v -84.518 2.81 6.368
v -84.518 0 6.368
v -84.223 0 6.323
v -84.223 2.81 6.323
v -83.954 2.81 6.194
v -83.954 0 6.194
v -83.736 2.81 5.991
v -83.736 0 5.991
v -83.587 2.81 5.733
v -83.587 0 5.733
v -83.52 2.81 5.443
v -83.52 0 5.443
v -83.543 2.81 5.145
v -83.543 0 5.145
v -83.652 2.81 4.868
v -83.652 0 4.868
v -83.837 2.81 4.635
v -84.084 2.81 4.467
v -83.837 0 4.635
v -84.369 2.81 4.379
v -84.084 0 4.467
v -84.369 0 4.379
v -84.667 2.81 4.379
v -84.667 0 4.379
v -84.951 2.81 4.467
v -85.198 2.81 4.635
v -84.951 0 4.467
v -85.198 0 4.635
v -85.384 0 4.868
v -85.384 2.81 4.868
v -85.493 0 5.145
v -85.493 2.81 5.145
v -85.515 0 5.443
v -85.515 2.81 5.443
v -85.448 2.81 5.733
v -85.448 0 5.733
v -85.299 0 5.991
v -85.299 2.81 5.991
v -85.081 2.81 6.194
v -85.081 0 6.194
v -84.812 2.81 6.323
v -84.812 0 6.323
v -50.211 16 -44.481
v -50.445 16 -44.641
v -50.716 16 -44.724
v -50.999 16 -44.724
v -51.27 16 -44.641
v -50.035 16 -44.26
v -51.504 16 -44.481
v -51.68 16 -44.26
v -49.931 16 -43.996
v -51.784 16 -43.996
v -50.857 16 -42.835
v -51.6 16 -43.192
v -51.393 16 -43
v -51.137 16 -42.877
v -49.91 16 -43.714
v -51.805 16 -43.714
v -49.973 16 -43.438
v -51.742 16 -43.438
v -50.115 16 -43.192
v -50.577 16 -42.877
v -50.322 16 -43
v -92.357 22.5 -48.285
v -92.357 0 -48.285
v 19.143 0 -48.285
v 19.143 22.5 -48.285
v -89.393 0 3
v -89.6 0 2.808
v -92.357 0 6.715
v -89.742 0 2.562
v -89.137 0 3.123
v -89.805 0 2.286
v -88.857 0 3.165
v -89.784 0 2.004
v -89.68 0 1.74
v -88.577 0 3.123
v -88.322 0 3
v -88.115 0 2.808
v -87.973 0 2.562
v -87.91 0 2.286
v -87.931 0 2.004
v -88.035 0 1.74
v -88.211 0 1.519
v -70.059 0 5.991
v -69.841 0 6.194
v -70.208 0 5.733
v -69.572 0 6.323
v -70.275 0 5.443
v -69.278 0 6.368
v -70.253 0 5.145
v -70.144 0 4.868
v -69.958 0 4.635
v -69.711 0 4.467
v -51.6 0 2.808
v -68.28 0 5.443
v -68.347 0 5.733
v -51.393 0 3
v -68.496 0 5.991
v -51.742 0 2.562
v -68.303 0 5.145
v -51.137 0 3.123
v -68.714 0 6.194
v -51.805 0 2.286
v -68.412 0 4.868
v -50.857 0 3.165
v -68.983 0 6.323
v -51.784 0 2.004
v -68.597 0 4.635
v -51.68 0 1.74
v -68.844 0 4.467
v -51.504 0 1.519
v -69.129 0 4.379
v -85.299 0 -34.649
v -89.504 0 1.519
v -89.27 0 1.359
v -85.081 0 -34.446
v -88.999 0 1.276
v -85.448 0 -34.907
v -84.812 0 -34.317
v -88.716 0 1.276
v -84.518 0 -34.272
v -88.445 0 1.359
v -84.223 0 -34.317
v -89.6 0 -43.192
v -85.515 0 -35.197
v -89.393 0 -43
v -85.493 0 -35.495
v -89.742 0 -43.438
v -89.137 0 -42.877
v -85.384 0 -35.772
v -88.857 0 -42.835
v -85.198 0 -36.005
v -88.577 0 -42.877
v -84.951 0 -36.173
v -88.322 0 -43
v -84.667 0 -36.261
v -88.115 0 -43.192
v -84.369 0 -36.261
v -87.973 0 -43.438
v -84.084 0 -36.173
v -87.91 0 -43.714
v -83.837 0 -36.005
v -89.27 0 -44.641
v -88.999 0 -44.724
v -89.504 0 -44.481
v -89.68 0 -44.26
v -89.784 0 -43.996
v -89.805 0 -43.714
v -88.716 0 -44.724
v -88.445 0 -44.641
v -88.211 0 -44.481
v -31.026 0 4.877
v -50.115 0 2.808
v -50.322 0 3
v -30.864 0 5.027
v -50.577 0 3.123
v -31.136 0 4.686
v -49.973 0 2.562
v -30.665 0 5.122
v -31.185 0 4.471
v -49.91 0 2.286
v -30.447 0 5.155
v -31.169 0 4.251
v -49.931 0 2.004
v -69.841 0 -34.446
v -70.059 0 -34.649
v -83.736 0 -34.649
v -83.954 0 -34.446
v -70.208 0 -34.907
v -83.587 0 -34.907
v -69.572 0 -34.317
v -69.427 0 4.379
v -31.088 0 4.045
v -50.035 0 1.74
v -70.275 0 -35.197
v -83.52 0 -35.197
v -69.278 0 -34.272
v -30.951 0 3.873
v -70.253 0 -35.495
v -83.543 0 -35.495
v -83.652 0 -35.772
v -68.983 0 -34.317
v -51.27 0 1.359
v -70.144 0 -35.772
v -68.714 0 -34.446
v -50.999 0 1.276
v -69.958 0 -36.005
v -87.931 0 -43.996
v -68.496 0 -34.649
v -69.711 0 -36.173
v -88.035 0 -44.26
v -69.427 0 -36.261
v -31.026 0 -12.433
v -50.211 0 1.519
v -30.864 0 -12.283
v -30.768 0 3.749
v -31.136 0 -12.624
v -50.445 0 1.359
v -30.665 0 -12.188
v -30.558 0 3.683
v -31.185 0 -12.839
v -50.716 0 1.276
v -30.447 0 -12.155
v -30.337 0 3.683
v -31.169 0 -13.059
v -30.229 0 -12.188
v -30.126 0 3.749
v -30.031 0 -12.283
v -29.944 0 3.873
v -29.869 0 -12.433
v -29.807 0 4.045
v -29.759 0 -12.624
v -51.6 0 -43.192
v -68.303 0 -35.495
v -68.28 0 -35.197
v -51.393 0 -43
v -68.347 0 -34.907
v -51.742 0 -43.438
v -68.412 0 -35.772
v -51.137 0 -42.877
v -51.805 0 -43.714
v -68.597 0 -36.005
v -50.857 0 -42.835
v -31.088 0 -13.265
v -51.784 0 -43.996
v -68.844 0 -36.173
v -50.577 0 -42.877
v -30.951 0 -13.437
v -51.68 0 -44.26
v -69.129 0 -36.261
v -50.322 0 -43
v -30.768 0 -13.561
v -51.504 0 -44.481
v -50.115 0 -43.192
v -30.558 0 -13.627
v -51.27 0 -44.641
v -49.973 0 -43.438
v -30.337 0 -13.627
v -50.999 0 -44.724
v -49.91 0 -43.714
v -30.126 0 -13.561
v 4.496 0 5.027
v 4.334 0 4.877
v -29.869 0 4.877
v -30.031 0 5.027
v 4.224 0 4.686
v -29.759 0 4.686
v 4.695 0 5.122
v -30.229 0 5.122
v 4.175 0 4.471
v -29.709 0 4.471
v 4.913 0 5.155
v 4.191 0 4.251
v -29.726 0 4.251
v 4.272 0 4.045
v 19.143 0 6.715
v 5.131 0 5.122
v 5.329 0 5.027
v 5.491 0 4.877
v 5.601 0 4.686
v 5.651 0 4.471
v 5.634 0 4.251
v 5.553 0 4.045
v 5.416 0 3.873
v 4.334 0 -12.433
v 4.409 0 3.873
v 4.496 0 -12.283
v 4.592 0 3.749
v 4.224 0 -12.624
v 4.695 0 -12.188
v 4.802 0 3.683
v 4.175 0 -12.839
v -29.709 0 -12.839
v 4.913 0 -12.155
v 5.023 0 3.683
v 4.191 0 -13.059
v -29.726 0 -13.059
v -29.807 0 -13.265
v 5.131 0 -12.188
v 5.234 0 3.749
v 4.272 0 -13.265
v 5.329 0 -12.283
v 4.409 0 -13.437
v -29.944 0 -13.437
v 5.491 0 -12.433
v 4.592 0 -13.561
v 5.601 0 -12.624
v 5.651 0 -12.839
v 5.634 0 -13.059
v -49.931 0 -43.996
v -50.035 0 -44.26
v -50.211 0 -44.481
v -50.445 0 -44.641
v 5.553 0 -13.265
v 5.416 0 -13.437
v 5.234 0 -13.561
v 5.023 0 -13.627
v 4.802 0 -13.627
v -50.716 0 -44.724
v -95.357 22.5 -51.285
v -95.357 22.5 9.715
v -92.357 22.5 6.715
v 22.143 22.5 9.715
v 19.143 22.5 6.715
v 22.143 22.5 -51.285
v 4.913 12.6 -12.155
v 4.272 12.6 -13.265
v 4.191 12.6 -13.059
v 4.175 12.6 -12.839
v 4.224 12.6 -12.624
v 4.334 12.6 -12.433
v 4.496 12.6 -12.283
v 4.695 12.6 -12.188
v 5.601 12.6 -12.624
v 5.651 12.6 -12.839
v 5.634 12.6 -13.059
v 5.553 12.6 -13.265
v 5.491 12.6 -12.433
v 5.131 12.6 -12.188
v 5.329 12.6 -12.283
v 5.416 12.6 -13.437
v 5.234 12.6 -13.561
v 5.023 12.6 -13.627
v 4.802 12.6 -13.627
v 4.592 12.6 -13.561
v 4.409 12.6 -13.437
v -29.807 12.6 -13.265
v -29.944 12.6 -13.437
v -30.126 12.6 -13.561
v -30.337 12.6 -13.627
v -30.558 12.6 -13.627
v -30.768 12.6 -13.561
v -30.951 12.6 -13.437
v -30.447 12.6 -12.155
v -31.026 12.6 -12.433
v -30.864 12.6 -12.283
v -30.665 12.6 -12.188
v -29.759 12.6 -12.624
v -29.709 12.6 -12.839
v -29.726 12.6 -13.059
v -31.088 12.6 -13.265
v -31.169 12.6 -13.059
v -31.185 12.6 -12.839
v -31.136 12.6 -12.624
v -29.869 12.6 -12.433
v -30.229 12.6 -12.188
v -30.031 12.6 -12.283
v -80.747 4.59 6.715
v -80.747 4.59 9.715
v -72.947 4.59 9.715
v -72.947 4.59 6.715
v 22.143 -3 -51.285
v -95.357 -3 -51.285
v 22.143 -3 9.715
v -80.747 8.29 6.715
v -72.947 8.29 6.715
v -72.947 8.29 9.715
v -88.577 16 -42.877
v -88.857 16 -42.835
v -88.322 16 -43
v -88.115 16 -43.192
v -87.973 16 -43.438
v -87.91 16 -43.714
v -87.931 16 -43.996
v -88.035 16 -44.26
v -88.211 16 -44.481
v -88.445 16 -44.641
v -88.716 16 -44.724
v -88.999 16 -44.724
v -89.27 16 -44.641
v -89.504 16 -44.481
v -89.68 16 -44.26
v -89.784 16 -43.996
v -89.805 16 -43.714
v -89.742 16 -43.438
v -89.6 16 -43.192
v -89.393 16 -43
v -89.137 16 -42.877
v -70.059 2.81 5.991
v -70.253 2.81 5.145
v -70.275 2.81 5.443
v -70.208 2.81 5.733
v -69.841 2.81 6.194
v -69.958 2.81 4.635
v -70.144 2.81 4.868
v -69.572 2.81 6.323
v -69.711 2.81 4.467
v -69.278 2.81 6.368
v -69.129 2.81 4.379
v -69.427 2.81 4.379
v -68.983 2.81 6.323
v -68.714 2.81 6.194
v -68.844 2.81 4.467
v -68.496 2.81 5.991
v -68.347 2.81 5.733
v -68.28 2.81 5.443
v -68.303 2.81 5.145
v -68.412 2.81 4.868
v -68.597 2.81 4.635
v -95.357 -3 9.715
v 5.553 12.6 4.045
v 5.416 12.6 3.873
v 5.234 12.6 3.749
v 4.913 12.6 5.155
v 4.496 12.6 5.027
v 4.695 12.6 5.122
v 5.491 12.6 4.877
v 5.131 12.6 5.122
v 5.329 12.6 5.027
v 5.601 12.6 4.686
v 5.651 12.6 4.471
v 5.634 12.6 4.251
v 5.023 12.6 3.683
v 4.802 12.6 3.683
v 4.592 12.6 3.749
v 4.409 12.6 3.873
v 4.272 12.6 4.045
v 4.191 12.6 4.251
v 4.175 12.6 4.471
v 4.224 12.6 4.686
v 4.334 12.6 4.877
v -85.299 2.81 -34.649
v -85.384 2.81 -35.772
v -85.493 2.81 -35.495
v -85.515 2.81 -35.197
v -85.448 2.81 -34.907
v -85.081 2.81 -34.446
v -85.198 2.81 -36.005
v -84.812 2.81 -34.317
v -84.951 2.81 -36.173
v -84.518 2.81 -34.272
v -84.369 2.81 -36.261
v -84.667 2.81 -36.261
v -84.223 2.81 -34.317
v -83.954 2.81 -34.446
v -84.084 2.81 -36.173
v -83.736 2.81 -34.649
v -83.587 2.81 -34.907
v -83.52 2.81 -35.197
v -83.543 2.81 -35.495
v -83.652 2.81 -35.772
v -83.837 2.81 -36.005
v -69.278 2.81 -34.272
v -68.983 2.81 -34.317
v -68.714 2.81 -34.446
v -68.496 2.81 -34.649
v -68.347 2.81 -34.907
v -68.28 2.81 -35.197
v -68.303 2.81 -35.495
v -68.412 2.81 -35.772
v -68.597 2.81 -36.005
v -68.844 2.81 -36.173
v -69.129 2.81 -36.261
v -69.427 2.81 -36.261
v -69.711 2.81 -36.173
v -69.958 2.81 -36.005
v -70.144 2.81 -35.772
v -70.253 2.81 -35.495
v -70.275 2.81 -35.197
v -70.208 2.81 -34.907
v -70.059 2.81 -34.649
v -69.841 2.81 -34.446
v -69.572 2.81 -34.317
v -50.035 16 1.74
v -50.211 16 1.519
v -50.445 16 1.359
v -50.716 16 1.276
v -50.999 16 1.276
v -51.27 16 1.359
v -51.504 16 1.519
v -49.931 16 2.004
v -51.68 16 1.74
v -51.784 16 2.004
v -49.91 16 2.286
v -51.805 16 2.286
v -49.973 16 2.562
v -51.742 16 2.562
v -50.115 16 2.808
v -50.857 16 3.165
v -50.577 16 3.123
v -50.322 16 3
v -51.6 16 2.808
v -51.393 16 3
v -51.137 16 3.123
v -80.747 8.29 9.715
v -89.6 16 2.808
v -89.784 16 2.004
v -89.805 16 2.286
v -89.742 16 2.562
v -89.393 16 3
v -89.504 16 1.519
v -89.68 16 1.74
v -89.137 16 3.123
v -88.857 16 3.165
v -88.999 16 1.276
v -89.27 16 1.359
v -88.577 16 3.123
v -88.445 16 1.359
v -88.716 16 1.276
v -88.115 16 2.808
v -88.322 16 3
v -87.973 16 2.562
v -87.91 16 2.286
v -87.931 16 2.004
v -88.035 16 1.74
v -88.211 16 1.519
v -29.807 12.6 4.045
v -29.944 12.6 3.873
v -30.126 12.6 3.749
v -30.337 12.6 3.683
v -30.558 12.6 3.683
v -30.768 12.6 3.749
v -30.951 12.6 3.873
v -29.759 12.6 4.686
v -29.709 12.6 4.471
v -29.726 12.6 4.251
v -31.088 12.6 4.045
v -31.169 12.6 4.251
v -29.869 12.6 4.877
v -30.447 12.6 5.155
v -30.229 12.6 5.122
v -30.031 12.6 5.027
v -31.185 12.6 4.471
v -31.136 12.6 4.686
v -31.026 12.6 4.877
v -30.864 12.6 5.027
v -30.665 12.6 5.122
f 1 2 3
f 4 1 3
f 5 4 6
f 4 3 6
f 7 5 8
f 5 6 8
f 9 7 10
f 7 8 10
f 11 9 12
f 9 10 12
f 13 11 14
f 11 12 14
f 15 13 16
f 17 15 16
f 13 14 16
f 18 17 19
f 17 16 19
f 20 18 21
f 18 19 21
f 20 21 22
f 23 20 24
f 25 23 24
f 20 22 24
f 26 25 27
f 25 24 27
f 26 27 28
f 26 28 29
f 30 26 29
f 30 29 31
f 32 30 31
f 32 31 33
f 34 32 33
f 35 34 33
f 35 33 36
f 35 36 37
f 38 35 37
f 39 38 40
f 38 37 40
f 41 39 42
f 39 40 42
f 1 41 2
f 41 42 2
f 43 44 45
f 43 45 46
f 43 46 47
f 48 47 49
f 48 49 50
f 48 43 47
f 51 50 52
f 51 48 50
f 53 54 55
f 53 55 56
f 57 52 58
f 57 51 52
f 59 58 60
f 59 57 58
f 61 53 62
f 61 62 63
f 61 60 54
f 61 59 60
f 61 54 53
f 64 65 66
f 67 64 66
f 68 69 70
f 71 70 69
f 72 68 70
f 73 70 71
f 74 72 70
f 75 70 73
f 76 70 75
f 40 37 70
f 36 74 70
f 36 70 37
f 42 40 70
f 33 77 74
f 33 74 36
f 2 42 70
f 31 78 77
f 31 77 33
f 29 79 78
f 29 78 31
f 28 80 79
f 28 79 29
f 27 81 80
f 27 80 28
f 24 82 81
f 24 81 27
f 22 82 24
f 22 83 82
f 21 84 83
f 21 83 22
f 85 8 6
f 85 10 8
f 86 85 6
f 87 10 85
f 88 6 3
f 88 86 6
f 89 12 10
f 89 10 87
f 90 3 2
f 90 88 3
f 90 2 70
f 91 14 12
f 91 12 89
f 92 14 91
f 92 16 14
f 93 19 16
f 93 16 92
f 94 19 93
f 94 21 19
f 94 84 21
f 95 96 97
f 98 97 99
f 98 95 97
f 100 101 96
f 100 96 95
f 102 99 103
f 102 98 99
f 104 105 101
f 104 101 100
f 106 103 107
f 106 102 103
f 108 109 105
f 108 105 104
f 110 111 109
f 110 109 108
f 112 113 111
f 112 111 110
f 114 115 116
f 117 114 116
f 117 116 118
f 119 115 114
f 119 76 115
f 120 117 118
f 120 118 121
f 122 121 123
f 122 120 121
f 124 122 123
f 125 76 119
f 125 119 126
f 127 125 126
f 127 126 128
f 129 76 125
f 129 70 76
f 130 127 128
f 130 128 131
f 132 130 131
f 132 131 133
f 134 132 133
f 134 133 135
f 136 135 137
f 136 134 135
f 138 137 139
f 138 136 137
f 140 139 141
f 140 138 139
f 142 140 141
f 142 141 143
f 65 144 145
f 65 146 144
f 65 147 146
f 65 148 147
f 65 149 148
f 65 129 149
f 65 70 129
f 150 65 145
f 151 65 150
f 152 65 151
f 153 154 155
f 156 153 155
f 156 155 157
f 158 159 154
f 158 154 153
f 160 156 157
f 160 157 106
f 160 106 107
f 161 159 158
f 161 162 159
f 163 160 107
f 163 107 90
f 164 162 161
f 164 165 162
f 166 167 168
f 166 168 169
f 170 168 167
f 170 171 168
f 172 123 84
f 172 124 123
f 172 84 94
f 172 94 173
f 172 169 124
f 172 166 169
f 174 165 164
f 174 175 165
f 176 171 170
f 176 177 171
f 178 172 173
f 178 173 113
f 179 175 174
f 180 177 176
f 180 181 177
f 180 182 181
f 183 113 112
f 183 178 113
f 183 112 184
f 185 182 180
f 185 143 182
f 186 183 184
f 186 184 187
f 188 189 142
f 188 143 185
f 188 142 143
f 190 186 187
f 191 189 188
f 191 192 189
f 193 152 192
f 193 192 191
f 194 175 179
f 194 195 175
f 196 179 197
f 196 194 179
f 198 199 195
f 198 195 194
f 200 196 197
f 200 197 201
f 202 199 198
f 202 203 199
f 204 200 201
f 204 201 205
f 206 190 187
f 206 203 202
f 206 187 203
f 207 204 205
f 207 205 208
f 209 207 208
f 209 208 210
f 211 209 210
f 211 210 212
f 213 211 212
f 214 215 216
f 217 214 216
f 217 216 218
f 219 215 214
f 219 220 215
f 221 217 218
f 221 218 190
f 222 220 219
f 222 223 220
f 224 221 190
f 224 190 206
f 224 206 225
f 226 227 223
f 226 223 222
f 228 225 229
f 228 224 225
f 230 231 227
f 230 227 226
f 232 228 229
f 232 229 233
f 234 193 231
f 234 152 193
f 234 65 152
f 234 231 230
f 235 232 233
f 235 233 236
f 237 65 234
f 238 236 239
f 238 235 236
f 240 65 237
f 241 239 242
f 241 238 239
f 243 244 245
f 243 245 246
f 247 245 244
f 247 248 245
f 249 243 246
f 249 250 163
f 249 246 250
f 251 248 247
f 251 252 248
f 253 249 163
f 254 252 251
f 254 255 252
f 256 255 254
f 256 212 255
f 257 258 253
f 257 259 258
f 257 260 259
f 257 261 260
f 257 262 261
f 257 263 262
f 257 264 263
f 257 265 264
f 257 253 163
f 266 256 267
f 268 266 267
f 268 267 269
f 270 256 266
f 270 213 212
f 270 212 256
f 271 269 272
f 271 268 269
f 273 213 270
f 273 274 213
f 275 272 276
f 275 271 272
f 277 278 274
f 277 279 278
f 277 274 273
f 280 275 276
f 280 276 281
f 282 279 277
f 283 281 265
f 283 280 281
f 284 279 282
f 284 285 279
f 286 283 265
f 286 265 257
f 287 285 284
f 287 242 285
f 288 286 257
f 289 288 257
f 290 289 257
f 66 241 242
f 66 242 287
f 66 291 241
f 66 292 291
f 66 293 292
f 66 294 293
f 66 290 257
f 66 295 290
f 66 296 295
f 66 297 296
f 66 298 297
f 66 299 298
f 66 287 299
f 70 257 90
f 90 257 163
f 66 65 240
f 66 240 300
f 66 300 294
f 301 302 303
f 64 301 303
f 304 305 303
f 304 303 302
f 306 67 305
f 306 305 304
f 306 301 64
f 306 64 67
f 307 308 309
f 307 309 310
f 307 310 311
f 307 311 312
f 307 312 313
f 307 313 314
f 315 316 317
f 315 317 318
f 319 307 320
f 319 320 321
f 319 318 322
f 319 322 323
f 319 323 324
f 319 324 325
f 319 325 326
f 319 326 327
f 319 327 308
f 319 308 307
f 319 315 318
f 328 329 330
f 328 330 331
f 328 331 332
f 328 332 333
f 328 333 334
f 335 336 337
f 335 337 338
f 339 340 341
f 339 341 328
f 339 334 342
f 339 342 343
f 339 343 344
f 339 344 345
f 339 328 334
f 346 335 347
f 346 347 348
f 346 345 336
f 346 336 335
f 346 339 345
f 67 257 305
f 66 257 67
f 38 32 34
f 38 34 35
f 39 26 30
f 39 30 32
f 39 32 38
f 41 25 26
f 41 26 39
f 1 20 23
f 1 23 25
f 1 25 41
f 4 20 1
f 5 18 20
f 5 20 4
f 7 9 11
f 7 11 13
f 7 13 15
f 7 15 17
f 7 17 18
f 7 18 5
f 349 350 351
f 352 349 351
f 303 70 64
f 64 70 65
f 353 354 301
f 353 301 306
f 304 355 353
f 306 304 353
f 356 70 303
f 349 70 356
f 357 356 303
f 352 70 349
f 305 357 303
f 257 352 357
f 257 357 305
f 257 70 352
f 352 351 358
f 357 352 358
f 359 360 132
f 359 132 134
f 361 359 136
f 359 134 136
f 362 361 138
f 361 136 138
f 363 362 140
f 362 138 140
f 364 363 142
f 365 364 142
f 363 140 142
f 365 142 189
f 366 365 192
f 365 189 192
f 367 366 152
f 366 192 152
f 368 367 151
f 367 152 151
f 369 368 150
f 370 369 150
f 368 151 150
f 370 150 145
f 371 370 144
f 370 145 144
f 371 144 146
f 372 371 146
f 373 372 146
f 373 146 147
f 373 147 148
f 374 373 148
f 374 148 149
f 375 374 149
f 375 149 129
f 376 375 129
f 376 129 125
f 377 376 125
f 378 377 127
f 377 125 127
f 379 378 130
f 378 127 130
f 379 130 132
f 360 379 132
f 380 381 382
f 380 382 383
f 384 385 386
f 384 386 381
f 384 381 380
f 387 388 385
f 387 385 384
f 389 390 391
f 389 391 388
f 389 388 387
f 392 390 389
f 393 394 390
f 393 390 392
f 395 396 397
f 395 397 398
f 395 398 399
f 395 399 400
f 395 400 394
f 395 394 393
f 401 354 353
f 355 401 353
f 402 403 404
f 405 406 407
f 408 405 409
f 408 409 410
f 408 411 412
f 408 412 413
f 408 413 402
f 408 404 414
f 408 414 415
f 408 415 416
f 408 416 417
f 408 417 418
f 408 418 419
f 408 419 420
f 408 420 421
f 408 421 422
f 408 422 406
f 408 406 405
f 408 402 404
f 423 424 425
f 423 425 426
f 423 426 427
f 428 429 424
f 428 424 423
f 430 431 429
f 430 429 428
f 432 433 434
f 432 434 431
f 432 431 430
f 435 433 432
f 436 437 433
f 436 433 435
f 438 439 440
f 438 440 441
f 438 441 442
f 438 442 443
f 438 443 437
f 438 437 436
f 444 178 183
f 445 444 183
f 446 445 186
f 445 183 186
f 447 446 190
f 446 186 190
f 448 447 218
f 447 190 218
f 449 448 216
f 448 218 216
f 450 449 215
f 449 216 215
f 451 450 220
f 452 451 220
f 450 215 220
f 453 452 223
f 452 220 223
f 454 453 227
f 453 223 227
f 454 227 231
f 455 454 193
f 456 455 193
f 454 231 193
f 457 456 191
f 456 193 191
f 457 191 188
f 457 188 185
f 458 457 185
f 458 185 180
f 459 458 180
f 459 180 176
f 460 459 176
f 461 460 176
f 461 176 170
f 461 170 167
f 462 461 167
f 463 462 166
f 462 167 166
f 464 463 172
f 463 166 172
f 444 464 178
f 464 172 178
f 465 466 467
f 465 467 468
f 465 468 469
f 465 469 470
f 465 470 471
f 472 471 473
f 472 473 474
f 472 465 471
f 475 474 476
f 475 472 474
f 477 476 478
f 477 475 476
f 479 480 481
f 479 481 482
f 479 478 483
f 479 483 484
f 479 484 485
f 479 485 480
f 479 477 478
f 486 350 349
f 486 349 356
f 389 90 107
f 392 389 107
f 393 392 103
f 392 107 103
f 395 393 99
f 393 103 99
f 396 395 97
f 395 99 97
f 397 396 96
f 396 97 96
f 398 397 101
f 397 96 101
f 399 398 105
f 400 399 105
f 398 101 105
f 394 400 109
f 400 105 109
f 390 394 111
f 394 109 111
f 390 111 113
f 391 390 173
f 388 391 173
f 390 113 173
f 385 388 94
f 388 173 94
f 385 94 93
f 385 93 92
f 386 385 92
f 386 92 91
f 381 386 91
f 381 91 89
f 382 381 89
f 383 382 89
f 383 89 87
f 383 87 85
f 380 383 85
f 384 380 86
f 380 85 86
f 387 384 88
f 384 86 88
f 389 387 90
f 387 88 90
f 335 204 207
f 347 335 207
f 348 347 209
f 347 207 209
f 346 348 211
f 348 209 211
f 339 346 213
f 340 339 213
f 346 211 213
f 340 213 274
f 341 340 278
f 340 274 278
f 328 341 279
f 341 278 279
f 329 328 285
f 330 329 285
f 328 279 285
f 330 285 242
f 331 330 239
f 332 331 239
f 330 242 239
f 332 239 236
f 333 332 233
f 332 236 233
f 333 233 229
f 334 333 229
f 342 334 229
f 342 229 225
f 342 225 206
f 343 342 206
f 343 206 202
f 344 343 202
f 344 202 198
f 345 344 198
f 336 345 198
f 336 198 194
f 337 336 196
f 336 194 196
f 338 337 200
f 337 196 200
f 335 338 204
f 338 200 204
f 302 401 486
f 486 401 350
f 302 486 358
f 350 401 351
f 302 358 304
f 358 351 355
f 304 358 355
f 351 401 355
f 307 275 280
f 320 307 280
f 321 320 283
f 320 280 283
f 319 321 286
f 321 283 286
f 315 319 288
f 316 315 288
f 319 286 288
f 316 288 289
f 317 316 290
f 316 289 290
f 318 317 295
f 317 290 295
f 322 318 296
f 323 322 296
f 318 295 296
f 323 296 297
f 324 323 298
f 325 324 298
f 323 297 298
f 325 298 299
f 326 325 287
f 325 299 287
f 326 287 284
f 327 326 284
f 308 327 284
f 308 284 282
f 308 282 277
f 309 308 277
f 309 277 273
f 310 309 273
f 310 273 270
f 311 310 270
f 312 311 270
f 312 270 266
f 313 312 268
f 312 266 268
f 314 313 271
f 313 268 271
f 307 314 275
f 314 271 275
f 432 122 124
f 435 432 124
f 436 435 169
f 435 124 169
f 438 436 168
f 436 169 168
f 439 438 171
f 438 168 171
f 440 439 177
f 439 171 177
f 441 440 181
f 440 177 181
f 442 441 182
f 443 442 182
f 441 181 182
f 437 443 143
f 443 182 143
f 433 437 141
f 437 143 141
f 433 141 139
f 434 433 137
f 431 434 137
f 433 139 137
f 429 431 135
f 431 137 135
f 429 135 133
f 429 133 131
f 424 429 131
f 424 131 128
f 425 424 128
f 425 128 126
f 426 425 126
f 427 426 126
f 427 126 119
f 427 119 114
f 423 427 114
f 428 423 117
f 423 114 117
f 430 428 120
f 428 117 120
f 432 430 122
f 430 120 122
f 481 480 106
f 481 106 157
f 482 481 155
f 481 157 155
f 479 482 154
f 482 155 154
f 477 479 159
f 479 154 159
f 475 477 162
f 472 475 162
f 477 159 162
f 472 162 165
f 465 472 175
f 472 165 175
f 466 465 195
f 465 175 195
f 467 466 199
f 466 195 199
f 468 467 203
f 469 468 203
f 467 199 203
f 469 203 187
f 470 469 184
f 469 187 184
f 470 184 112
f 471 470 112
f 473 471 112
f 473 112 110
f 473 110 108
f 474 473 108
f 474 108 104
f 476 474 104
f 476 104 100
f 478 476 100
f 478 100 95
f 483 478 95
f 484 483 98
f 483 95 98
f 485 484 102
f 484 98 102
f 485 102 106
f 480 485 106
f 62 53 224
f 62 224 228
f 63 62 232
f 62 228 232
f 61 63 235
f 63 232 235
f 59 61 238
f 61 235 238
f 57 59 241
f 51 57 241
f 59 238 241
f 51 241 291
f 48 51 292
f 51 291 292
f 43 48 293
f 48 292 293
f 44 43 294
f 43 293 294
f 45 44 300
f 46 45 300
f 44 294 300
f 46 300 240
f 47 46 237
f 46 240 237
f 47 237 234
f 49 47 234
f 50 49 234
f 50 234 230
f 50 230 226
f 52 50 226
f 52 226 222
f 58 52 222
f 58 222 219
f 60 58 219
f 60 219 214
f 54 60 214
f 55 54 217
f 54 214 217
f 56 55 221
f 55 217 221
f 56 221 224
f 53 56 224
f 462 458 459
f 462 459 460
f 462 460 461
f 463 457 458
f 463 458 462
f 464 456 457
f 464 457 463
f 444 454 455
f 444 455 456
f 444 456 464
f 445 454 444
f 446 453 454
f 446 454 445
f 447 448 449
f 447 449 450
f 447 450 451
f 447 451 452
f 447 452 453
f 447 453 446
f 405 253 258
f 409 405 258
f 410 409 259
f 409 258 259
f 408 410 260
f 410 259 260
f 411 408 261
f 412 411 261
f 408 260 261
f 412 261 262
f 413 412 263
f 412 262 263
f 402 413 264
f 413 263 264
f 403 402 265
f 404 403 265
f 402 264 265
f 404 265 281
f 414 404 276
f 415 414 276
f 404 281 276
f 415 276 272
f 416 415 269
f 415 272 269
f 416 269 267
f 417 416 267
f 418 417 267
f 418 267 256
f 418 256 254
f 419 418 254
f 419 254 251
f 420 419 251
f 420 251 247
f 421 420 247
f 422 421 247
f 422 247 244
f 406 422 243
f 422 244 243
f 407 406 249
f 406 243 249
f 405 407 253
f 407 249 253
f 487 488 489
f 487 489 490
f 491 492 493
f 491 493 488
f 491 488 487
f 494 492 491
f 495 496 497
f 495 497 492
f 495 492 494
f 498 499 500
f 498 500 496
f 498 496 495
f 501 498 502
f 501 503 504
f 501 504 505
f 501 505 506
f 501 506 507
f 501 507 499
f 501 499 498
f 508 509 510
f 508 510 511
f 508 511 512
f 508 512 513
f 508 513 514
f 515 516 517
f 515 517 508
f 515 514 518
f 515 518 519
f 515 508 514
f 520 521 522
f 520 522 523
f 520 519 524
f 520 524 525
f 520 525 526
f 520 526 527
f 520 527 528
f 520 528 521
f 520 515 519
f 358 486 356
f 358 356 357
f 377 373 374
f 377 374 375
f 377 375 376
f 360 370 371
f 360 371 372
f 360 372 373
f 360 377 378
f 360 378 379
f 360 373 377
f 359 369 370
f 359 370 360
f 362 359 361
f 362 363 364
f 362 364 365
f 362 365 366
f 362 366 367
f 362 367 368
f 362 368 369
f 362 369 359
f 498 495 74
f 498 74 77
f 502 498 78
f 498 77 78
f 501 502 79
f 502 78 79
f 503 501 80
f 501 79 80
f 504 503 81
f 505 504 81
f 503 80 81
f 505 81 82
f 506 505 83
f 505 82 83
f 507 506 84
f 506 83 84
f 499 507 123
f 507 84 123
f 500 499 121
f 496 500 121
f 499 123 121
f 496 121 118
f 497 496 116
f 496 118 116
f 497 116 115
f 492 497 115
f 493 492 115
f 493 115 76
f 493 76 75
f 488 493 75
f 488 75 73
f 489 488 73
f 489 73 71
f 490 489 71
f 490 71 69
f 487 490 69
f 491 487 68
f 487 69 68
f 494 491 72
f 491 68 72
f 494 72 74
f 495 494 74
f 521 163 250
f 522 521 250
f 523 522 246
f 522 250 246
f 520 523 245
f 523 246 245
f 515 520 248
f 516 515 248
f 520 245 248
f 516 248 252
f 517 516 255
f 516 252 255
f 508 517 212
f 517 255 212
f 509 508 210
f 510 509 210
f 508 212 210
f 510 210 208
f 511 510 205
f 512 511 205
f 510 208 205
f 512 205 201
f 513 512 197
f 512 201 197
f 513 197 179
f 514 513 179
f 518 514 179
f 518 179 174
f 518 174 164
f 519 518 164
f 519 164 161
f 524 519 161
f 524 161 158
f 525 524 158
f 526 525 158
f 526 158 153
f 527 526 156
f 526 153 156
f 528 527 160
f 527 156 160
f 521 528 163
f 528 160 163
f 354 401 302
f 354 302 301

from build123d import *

# Parameters (mm, degrees)
ESBO_O_W                 = 111.5
ESBO_O_H                 = 55
RESSALTO_EXTRUS_O1_DEPTH = 22.5
CASCA3_T                 = 3
ESBO_O12_R               = 0.95
RESSALTO_EXTRUS_O2_DEPTH = 16
ESBO_O15_W               = 7.8
ESBO_O15_H               = 3.7
USB_DEPTH                = 3.9
ESBO_O16_R               = 1
RESSALTO_EXTRUS_O4_DEPTH = 2.81
ESBO_O17_R               = 0.74
RESSALTO_EXTRUS_O5_DEPTH = 12.6


with BuildPart() as part:
    # Esboço → Ressalto-extrusão1 (new body)
    with BuildSketch(Plane(origin=(0, 0, 0), x_dir=(1, 0, 0), z_dir=(0, 1, 0))):
        with Locations((-36.607366715, 20.784772609)):
            Rectangle(ESBO_O_W, ESBO_O_H)
    extrude(amount=RESSALTO_EXTRUS_O1_DEPTH)

    # Casca3
    casca3_openings = [part.faces().sort_by_distance(p)[0] for p in [
        (-36.607366715, 22.5, -20.784772609),
    ]]
    offset(amount=CASCA3_T, openings=casca3_openings, kind=Kind.INTERSECTION)

    # Esboço12 → Ressalto-extrusão2 (add)
    with BuildSketch(Plane(origin=(0, 0, 0), x_dir=(1, 0, 0), z_dir=(0, 1, 0))):
        with Locations(Location((-50.857366715, 43.784772609, 0), (0, 0, 270))):
            Circle(ESBO_O12_R)
        with Locations(Location((-88.857366715, 43.784772609, 0), (0, 0, 270))):
            Circle(ESBO_O12_R)
        with Locations(Location((-88.857366715, -2.215227391, 0), (0, 0, 270))):
            Circle(ESBO_O12_R)
        with Locations(Location((-50.857366715, -2.215227391, 0), (0, 0, 270))):
            Circle(ESBO_O12_R)
    extrude(amount=RESSALTO_EXTRUS_O2_DEPTH)

    # Esboço15 → usb (cut)
    with BuildSketch(Plane.XY.offset(9.715227391)):
        with Locations((-76.847366715, 6.44)):
            Rectangle(ESBO_O15_W, ESBO_O15_H)
    extrude(amount=-USB_DEPTH, mode=Mode.SUBTRACT)

    # Esboço16 → Ressalto-extrusão4 (add)
    with BuildSketch(Plane(origin=(0, 0, 0), x_dir=(1, 0, 0), z_dir=(0, 1, 0))):
        with Locations(Location((-84.517607583, 35.272111724, 0), (0, 0, 270))):
            Circle(ESBO_O16_R)
        with Locations(Location((-69.277607583, 35.272111724, 0), (0, 0, 270))):
            Circle(ESBO_O16_R)
        with Locations(Location((-69.277607583, -5.367888276, 0), (0, 0, 270))):
            Circle(ESBO_O16_R)
        with Locations(Location((-84.517607583, -5.367888276, 0), (0, 0, 270))):
            Circle(ESBO_O16_R)
    extrude(amount=RESSALTO_EXTRUS_O4_DEPTH)

    # Esboço17 → Ressalto-extrusão5 (add)
    with BuildSketch(Plane(origin=(0, 0, 0), x_dir=(1, 0, 0), z_dir=(0, 1, 0))):
        with Locations(Location((-30.447366715, 12.894772609, 0), (0, 0, 270))):
            Circle(ESBO_O17_R)
        with Locations(Location((4.912633285, 12.894772609, 0), (0, 0, 270))):
            Circle(ESBO_O17_R)
        with Locations(Location((4.912633285, -4.415227391, 0), (0, 0, 270))):
            Circle(ESBO_O17_R)
        with Locations(Location((-30.447366715, -4.415227391, 0), (0, 0, 270))):
            Circle(ESBO_O17_R)
    extrude(amount=RESSALTO_EXTRUS_O5_DEPTH)


solid = part.part
